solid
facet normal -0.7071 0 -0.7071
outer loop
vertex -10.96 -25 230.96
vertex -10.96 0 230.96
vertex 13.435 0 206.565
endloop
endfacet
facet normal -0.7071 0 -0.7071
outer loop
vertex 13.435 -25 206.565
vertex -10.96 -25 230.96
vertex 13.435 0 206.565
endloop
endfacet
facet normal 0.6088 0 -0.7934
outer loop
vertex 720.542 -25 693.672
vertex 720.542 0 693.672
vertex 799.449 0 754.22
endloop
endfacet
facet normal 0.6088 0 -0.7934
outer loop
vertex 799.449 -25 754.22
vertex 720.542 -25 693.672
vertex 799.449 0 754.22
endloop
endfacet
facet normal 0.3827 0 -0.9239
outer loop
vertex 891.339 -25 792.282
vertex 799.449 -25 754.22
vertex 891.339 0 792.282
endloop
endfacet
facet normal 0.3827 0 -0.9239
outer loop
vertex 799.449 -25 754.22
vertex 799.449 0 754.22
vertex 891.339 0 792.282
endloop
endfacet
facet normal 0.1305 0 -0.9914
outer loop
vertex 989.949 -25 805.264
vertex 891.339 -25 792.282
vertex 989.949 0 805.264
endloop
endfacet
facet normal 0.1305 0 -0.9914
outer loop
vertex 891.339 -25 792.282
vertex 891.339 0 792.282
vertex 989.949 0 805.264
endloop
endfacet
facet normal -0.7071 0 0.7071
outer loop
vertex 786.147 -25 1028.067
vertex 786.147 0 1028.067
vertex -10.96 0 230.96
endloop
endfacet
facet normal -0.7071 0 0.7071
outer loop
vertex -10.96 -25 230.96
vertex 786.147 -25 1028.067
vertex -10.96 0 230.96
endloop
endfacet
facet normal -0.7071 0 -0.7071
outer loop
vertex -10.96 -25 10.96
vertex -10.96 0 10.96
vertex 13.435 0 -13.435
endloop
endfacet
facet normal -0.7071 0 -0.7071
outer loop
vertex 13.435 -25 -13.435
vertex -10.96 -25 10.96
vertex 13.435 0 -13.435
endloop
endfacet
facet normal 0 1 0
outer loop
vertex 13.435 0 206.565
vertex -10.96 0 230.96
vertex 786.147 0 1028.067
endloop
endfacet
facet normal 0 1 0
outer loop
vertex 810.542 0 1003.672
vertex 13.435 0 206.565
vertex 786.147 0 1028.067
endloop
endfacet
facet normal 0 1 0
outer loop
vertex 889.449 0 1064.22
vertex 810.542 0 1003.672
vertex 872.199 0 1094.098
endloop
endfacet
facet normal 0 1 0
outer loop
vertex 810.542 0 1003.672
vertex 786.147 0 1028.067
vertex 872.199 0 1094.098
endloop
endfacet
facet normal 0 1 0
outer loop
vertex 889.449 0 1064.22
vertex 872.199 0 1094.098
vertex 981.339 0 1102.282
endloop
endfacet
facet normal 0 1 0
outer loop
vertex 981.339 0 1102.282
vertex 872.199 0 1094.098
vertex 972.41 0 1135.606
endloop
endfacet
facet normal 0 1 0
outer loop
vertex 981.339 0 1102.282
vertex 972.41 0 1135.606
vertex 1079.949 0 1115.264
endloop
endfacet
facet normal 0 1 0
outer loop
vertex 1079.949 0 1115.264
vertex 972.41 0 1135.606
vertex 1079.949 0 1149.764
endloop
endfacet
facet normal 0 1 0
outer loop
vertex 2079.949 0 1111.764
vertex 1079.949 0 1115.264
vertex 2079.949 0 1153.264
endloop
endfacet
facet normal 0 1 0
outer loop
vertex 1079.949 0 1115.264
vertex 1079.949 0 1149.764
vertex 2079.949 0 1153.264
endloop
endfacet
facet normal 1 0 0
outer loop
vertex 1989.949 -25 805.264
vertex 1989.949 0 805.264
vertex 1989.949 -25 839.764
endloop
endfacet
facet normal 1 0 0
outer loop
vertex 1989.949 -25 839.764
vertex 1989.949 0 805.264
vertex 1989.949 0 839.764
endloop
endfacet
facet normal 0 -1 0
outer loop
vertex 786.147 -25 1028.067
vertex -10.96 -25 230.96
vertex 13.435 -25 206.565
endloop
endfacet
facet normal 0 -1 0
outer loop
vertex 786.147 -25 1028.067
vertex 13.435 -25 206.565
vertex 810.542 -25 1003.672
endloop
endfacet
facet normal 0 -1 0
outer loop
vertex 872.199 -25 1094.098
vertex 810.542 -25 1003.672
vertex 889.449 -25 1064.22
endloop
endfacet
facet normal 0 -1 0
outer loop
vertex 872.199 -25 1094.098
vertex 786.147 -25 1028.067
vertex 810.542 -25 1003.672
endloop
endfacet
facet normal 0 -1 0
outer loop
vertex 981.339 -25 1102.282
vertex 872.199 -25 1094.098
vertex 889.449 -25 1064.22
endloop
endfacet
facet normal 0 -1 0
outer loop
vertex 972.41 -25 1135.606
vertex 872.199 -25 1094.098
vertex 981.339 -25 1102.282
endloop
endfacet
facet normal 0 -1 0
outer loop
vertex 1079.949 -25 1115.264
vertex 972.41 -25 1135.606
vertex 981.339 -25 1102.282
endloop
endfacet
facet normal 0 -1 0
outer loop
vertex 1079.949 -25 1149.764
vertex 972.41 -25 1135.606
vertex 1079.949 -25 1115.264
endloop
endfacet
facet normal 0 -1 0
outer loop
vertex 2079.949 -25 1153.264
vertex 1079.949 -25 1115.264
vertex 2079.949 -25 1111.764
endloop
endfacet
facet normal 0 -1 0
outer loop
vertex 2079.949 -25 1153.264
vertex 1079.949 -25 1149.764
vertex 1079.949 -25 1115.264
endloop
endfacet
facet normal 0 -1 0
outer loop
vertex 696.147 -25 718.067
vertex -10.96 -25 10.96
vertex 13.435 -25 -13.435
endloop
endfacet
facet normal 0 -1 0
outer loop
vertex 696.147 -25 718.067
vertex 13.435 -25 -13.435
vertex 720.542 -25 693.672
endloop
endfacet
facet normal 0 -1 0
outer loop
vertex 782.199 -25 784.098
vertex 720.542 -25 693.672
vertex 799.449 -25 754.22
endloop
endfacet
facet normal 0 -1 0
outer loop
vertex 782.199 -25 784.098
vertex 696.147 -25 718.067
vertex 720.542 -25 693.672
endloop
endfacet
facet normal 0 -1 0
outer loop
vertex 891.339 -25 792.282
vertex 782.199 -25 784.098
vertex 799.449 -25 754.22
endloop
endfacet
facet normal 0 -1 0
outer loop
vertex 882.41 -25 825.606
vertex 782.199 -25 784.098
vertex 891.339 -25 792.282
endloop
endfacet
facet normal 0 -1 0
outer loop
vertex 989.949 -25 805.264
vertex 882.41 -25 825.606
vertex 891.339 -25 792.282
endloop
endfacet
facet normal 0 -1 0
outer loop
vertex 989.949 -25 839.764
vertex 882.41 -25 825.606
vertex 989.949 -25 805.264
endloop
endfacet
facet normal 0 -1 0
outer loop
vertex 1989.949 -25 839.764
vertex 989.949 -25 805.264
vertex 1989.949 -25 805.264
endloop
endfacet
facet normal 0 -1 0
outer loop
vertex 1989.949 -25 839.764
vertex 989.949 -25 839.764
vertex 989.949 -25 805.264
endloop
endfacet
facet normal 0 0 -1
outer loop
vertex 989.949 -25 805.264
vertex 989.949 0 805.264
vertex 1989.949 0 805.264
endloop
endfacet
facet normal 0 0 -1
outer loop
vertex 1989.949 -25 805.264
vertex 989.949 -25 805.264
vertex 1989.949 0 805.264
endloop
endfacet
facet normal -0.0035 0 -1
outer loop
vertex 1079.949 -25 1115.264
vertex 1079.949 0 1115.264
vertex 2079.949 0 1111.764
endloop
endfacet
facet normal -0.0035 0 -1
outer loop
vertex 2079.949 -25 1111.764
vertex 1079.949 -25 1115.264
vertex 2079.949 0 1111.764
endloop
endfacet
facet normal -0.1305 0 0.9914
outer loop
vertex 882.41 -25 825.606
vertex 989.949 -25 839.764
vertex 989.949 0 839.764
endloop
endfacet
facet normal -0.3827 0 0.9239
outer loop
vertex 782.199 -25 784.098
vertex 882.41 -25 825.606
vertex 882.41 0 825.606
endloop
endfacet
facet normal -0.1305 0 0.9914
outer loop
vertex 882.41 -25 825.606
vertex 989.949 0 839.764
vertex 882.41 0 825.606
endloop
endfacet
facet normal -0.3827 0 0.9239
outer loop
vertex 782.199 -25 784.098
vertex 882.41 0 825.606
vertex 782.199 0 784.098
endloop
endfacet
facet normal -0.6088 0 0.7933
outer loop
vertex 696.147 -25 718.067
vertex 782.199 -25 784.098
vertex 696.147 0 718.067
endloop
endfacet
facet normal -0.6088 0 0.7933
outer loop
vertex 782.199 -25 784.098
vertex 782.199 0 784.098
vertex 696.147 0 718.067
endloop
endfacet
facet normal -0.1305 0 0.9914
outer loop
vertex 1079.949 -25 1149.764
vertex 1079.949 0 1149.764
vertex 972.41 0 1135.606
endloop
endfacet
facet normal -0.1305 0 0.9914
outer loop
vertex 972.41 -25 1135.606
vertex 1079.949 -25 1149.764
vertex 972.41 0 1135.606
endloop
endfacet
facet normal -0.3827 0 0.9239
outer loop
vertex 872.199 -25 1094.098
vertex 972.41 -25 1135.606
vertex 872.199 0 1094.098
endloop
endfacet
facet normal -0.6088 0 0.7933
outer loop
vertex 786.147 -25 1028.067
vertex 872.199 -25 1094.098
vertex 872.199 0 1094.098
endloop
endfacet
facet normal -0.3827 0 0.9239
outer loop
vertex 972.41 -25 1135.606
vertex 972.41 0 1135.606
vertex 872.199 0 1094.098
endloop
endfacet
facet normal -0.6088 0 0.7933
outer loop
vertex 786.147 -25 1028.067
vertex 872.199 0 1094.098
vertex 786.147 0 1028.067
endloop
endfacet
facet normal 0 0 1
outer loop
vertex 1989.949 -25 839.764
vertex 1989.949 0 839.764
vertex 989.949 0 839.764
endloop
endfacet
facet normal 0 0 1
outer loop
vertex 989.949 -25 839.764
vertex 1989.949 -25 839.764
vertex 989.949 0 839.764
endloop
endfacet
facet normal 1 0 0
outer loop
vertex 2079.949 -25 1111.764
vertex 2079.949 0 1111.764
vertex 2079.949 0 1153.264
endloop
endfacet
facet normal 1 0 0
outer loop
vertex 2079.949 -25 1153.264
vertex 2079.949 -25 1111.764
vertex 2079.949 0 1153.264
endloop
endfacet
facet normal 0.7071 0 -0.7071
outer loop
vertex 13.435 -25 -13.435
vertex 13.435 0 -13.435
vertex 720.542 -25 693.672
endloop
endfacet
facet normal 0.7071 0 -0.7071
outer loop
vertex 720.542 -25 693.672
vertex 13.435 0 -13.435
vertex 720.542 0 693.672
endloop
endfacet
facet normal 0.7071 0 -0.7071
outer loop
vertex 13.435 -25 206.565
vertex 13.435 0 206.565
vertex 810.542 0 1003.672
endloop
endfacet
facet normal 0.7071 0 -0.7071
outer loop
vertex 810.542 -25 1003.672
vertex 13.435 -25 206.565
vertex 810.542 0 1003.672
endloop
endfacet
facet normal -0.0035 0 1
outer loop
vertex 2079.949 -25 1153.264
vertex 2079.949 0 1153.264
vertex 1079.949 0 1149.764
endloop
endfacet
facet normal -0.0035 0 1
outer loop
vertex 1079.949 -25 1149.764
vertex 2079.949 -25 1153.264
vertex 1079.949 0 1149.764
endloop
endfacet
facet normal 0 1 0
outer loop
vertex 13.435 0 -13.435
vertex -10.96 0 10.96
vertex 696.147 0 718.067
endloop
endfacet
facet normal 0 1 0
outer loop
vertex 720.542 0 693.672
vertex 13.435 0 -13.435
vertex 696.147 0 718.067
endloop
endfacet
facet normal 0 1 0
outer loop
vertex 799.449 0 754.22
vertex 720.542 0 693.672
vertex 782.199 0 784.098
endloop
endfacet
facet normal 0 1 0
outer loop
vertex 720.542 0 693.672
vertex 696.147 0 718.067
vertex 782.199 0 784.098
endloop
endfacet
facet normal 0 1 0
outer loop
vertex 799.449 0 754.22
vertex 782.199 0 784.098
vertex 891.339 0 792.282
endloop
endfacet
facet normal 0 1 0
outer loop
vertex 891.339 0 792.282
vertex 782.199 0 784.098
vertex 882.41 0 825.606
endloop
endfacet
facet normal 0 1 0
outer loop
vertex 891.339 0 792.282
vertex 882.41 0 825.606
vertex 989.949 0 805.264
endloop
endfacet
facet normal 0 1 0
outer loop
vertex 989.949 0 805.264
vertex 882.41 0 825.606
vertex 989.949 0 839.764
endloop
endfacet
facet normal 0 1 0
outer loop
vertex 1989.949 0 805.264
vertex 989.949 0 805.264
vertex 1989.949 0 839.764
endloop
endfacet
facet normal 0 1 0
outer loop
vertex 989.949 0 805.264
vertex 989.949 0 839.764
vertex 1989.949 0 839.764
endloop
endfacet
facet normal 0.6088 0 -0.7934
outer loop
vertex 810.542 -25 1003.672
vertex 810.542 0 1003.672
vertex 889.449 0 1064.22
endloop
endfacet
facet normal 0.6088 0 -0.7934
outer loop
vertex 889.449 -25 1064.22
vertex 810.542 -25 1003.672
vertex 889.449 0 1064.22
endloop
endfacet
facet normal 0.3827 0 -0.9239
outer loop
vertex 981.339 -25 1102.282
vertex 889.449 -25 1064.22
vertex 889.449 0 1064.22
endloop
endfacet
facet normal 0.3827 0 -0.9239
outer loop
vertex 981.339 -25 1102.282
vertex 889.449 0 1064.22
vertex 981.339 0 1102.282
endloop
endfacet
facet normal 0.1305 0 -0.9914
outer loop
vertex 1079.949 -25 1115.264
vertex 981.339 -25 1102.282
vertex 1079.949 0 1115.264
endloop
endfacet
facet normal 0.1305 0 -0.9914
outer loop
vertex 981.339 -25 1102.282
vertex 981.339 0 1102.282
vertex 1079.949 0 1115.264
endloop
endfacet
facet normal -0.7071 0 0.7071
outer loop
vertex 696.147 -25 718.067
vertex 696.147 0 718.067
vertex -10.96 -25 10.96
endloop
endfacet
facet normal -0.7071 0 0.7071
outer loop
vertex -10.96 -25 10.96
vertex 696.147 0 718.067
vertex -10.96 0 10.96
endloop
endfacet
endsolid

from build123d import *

# Parameters (mm, degrees)
F1_DEPTH = 25


with BuildPart() as f1:
    # F0 (on Front) → F1 (new body)
    with BuildSketch(Plane.XZ):
        with BuildLine():
            Line((786.146626, 1028.066936), (696.146626, 938.066936))
            Line((696.146626, 938.066936), (-10.960155, 230.960155))
            Line((-10.960155, 230.960155), (0, 220))
            Line((0, 220), (13.435029, 206.564971))
            Line((13.435029, 206.564971), (810.54181, 1003.671752))
            ThreePointArc((810.54181, 1003.671752), (934.147106, 1086.262171), (1079.949494, 1115.264069))
            Line((1079.949494, 1115.264069), (2079.949494, 1111.764069))
            Line((2079.949494, 1111.764069), (2079.949494, 1134.264069))
            Line((2079.949494, 1134.264069), (2079.949494, 1153.264069))
            Line((2079.949494, 1153.264069), (1079.949494, 1149.764069))
            ThreePointArc((1079.949494, 1149.764069), (920.944528, 1118.136014), (786.146626, 1028.066936))
        make_face()
        with BuildLine():
            Line((-10.960155, 10.960155), (0, 0))
            Line((0, 0), (13.435029, -13.435029))
            Line((13.435029, -13.435029), (720.54181, 693.671752))
            ThreePointArc((720.54181, 693.671752), (844.147106, 776.262171), (989.949494, 805.264069))
            Line((989.949494, 805.264069), (1989.949494, 805.264069))
            Line((1989.949494, 805.264069), (1989.949494, 824.264069))
            Line((1989.949494, 824.264069), (1989.949494, 839.764069))
            Line((1989.949494, 839.764069), (989.949494, 839.764069))
            ThreePointArc((989.949494, 839.764069), (830.944528, 808.136014), (696.146626, 718.066936))
            Line((696.146626, 718.066936), (-10.960155, 10.960155))
        make_face()
    extrude(amount=F1_DEPTH)


solid = f1.part
